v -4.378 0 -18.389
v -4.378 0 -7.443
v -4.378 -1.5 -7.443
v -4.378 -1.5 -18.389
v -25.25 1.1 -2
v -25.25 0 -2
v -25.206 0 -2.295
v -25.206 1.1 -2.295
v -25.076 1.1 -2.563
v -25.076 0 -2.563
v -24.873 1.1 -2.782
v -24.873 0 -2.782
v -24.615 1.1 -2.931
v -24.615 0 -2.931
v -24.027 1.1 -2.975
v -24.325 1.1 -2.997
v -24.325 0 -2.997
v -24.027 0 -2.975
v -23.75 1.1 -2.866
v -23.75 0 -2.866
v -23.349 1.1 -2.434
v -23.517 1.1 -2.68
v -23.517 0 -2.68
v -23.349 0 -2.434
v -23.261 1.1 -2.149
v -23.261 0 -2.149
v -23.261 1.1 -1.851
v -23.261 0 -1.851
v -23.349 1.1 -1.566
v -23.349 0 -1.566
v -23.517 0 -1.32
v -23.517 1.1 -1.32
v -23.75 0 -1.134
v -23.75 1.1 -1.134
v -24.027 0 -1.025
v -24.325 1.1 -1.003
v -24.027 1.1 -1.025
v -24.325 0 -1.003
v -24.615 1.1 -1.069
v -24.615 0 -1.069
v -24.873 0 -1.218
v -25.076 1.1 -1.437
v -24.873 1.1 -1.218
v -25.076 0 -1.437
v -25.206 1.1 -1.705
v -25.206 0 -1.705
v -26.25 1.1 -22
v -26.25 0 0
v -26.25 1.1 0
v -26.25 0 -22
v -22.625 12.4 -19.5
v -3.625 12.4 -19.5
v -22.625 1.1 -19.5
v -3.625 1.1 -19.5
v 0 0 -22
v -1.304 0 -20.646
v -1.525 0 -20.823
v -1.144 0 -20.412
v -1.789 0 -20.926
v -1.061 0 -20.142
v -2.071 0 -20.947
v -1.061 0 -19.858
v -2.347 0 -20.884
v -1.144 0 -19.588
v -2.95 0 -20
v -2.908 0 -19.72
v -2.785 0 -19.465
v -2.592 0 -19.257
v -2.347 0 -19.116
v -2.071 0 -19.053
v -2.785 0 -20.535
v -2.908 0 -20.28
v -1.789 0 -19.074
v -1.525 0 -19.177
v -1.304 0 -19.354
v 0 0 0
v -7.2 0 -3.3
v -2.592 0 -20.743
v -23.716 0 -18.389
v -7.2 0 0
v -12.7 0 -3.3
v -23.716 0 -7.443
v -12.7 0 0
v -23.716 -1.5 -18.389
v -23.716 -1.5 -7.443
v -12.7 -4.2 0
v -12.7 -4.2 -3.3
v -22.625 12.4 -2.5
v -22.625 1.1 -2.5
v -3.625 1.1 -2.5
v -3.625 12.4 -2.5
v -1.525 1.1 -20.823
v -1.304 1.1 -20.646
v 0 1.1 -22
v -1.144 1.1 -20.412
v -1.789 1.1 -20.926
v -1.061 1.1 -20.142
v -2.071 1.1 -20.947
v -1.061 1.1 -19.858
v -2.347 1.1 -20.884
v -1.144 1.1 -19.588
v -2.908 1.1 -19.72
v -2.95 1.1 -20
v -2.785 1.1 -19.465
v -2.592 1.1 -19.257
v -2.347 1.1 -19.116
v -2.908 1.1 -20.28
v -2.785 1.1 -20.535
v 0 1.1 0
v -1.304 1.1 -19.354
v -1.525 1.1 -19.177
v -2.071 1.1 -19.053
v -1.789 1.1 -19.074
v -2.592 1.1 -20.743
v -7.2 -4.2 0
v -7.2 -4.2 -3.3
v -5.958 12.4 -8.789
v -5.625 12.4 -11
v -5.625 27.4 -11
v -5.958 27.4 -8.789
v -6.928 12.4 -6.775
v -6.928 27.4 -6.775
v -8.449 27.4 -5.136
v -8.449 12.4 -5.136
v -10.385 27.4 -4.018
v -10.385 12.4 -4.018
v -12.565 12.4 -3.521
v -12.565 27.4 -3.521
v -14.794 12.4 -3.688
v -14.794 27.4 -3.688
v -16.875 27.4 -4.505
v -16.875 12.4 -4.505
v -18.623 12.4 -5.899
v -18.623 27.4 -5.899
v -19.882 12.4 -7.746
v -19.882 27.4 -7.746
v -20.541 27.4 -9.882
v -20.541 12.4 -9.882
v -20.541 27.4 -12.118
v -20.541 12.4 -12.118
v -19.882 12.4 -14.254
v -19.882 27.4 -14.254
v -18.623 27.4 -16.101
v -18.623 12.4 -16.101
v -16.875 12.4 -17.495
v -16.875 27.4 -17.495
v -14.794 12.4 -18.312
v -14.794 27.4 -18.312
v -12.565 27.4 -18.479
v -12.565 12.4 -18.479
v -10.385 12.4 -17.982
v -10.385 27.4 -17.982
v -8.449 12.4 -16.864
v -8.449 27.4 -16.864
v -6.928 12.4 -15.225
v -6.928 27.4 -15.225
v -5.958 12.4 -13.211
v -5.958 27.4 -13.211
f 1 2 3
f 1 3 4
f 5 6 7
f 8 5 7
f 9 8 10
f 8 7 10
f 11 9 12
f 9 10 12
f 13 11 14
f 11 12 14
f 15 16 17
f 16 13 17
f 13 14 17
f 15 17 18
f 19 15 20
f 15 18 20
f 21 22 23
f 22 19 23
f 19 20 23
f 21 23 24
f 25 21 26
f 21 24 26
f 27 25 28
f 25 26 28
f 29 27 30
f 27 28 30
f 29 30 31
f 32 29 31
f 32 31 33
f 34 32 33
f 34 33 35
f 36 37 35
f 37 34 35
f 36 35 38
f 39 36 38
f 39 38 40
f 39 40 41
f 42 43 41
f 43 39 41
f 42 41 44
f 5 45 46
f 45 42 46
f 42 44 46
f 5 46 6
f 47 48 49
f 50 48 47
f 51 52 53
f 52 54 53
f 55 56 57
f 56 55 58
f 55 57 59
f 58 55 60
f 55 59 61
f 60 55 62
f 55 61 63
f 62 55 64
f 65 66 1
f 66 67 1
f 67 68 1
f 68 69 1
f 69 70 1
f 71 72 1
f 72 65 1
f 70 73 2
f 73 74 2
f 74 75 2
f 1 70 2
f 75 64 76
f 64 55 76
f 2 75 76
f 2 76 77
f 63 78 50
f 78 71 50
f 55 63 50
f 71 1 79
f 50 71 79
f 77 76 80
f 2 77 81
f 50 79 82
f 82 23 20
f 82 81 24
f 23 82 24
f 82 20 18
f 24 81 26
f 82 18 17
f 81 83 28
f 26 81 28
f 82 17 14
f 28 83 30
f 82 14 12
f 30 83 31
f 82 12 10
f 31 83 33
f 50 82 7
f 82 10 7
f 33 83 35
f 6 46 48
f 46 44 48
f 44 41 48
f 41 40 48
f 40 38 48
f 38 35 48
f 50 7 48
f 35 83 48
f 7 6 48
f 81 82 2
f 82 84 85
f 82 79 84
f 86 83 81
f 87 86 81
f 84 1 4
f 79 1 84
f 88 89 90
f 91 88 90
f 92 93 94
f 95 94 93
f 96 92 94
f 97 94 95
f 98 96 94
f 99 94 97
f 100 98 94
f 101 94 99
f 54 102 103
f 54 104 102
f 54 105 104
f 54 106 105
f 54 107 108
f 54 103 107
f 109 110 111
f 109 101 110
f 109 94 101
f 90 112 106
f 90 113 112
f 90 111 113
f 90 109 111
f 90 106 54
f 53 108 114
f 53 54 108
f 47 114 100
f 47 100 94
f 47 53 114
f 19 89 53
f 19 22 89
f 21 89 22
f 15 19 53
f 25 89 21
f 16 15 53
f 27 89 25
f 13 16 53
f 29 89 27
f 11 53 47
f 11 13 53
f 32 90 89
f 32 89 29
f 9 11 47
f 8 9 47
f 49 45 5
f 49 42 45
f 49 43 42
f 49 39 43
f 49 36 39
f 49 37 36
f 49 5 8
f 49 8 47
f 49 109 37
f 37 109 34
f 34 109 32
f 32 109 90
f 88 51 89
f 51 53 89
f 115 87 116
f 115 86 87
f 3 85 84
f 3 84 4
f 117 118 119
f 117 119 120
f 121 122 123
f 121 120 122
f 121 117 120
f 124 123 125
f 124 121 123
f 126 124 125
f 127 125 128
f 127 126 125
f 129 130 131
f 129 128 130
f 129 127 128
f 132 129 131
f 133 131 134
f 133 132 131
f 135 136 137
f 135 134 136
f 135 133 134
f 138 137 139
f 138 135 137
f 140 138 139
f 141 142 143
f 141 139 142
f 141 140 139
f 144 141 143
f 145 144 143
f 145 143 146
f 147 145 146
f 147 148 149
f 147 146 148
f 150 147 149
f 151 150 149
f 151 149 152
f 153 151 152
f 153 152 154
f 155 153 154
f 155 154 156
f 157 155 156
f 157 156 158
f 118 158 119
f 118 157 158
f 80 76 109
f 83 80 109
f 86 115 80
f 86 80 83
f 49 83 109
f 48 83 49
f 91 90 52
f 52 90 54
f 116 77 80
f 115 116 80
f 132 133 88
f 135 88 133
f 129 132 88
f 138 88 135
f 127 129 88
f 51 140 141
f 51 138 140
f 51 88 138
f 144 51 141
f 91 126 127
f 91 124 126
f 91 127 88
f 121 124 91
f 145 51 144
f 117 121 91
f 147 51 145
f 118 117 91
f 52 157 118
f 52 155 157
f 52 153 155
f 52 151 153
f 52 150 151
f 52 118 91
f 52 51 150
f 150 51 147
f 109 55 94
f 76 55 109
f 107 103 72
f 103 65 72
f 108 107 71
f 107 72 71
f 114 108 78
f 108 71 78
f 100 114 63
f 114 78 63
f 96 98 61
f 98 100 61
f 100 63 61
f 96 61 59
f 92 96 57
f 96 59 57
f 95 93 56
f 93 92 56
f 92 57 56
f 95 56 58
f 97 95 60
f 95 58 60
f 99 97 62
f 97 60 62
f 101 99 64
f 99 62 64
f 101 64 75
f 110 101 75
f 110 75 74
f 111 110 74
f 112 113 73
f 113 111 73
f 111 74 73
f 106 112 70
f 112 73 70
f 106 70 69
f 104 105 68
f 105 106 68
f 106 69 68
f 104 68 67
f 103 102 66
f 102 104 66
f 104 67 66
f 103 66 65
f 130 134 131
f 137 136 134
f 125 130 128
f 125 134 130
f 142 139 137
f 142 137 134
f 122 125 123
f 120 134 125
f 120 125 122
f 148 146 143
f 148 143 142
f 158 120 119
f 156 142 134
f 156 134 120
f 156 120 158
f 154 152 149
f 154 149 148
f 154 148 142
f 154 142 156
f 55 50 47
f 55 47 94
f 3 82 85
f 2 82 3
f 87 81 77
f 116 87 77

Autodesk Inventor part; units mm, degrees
ref_plane "YZ Plane" through (0, 0, 0) normal (1, 0, 0) x (0, 1, 0)
ref_plane "XZ Plane" through (0, 0, 0) normal (0, 1, 0) x (-1, 0, 0)
ref_plane "XY Plane" through (0, 0, 0) normal (0, 0, 1) x (1, 0, 0)
sketch "Sketch1" plane through (0, 0, 0) normal (0, 1, 0) x (-1, 0, 0)
  line L0 (0, 0) -> (26.25, 0)
  line L1 (26.25, 0) -> (26.25, -22)
  line L2 (26.25, -22) -> (0, -22)
  line L3 (0, -22) -> (0, 0)
  circle A0 centre (2, -20) radius 0.95
  circle A1 centre (24.25, -2) radius 1
  dimension "d0" = 26.25
  dimension "d1" = 22
  dimension "d3" = 1.9
  dimension "d6" = 2
  dimension "d18" = 2
  dimension "d19" = 2
  dimension "d20" = 2
  dimension "d21" = 2
extrude "Extrusion1" add sketch "Sketch1" along normal blind 1.1
sketch "Sketch2" plane through (0, 1.1, 0) normal (0, 1, 0) x (1, 0, 0)
  line L0 (0, 22) -> (-26.25, 22) projected
  line L1 (0, 0) -> (0, 22) projected
  line L2 (-22.625, 2.5) -> (-3.625, 2.5)
  line L3 (-3.625, 2.5) -> (-3.625, 19.5)
  line L4 (-3.625, 19.5) -> (-22.625, 19.5)
  line L5 (-22.625, 19.5) -> (-22.625, 2.5)
  line L6 (-22.625, 2.5) -> (-3.625, 19.5) construction
  line L7 (-3.625, 2.5) -> (-22.625, 19.5) construction
  point P0 (-13.125, 22)
  point P1 (0, 11)
  point P2 (-13.125, 11)
  point P3 (0, 11)
  point P4 (-13.125, 11)
  point P5 (-13.125, 22)
  point P6 (-13.125, 11)
  dimension "d11" = 19
  dimension "d12" = 17
extrude "Extrusion2" add sketch "Sketch2" along normal blind 11.3
sketch "Sketch3" plane through (0, 12.4, 0) normal (0, 1, 0) x (1, 0, 0)
  line L0 (-3.625, 2.5) -> (-3.625, 19.5) construction
  line L1 (-3.625, 19.5) -> (-22.625, 19.5) construction
  line L2 (-22.625, 19.5) -> (-22.625, 2.5) construction
  line L3 (-22.625, 2.5) -> (-3.625, 2.5) construction
  line L4 (-3.625, 19.5) -> (-3.625, 2.5) construction
  circle A0 centre (-13.125, 11) radius 7.5
  point P0 (0, 0)
  point P1 (-13.125, 19.5)
  point P2 (-3.625, 11)
  dimension "d15" = 15
extrude "Extrusion3" add sketch "Sketch3" along normal blind 15
sketch "Sketch4" plane through (0, 0, 0) normal (0, -1, 0) x (1, 0, 0)
  line L0 (-7.2, 0) -> (-12.7, 0)
  line L1 (-12.7, 0) -> (-12.7, -3.3)
  line L2 (-12.7, -3.3) -> (-7.2, -3.3)
  line L3 (-7.2, -3.3) -> (-7.2, 0)
  line L4 (0, 0) -> (-26.25, 0) projected
  circle A0 centre (-2, -20) radius 0.95 projected
  dimension "d22" = 5.5
  dimension "d23" = 3.3
  dimension "d28" = 5.2
extrude "Extrusion4" add sketch "Sketch4" along normal blind 4.2 contours L3 L2 L1 L0
sketch "Sketch5" plane through (0, 0, 0) normal (0, -1, 0) x (1, 0, 0)
  line L0 (-4.3784, -18.3892) -> (-23.7162, -18.3892)
  line L1 (-23.7162, -18.3892) -> (-23.7162, -7.4432)
  line L2 (-23.7162, -7.4432) -> (-4.3784, -7.4432)
  line L3 (-4.3784, -7.4432) -> (-4.3784, -18.3892)
  point P0 (0, 0)
extrude "Extrusion5" add sketch "Sketch5" along normal blind 1.5
properties part number "camera_prz"
